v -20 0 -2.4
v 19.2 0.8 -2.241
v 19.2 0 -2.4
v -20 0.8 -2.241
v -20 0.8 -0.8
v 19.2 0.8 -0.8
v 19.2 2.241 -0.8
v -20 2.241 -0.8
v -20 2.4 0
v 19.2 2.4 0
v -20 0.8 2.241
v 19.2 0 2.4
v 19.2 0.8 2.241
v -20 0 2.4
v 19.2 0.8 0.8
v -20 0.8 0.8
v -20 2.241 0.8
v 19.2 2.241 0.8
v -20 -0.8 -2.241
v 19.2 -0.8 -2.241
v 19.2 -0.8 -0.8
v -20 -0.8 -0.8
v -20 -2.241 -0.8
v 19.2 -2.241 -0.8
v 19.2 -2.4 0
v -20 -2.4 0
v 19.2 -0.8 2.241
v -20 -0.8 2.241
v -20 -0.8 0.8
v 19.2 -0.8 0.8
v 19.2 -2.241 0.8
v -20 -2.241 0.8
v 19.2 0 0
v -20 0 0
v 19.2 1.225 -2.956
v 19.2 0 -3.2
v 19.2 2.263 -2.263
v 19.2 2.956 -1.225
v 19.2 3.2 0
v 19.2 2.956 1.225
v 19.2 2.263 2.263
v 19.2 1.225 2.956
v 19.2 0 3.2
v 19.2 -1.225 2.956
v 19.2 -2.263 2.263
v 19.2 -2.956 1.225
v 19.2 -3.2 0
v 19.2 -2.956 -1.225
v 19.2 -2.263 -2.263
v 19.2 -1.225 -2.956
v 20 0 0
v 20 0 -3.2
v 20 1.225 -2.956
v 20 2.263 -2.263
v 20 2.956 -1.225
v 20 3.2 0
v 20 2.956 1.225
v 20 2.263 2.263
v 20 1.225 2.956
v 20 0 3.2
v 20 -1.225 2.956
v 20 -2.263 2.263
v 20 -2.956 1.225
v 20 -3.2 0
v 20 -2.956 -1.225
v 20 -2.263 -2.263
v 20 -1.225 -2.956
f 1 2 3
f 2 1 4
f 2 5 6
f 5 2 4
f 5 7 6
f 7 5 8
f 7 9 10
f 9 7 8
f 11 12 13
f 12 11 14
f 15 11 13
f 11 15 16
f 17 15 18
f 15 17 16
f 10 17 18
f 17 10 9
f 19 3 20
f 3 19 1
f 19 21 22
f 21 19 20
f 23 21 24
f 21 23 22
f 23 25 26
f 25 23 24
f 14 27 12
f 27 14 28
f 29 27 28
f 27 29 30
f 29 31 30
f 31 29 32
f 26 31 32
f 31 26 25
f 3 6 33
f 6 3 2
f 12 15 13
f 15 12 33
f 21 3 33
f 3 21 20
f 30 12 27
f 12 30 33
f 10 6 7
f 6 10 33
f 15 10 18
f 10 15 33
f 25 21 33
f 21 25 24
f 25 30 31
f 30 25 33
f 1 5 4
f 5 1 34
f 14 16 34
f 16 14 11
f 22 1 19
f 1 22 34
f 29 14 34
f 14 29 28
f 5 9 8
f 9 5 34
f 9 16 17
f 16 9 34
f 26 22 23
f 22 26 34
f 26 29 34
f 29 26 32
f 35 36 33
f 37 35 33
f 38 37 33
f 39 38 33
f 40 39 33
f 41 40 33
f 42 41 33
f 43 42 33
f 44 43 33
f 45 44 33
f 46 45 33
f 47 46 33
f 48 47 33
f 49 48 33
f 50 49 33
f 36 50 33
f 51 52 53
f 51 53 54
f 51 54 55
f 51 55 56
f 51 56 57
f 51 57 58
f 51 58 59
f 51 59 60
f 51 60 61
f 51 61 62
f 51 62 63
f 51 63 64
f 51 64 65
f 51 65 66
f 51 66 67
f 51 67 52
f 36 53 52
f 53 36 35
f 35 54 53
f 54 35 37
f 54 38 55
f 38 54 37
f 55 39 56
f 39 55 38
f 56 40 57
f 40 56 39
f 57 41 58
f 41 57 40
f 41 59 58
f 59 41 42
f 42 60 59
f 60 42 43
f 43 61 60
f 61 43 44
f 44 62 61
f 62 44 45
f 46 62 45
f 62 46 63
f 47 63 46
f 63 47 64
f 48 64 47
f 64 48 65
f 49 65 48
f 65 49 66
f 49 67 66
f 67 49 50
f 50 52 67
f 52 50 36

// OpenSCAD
// file: ../p/4-4edge.scad
use <../lib.scad>
function ldraw_lib__4_4edge() = [
// 0 Circle 1.0
// 0 Name: 4-4edge.dat
// 0 Author: James Jessiman
// 0 !LDRAW_ORG Primitive UPDATE 2017-01
// 0 !LICENSE Licensed under CC BY 2.0 and CC BY 4.0 : see CAreadme.txt
// 
// 0 BFC CERTIFY CCW
  [0,"BFC","CERTIFY"],
  [0,"BFC","CCW"],
// 
// 0 !HISTORY 1998-12-15 [PTadmin] Official Update 1998-10
// 0 !HISTORY 2005-12-28 [PTadmin] Official Update 2005-01
// 0 !HISTORY 2007-06-24 [PTadmin] Header formatted for Contributor Agreement
// 0 !HISTORY 2008-07-01 [PTadmin] Official Update 2008-01
// 0 !HISTORY 2017-01-15 [Steffen] BFCed
// 0 !HISTORY 2017-12-30 [PTadmin] Official Update 2017-01
// 
// 
// 2 24 1 0 0 0.9239 0 0.3827
  [2,24,1,0,0,0.9239,0,0.3827],
// 2 24 0.9239 0 0.3827 0.7071 0 0.7071
  [2,24,0.9239,0,0.3827,0.7071,0,0.7071],
// 2 24 0.7071 0 0.7071 0.3827 0 0.9239
  [2,24,0.7071,0,0.7071,0.3827,0,0.9239],
// 2 24 0.3827 0 0.9239 0 0 1
  [2,24,0.3827,0,0.9239,0,0,1],
// 2 24 0 0 1 -0.3827 0 0.9239
  [2,24,0,0,1,-0.3827,0,0.9239],
// 2 24 -0.3827 0 0.9239 -0.7071 0 0.7071
  [2,24,-0.3827,0,0.9239,-0.7071,0,0.7071],
// 2 24 -0.7071 0 0.7071 -0.9239 0 0.3827
  [2,24,-0.7071,0,0.7071,-0.9239,0,0.3827],
// 2 24 -0.9239 0 0.3827 -1 0 -0
  [2,24,-0.9239,0,0.3827,-1,0,-0],
// 2 24 -1 0 -0 -0.9239 0 -0.3827
  [2,24,-1,0,-0,-0.9239,0,-0.3827],
// 2 24 -0.9239 0 -0.3827 -0.7071 0 -0.7071
  [2,24,-0.9239,0,-0.3827,-0.7071,0,-0.7071],
// 2 24 -0.7071 0 -0.7071 -0.3827 0 -0.9239
  [2,24,-0.7071,0,-0.7071,-0.3827,0,-0.9239],
// 2 24 -0.3827 0 -0.9239 0 0 -1
  [2,24,-0.3827,0,-0.9239,0,0,-1],
// 2 24 0 0 -1 0.3827 0 -0.9239
  [2,24,0,0,-1,0.3827,0,-0.9239],
// 2 24 0.3827 0 -0.9239 0.7071 0 -0.7071
  [2,24,0.3827,0,-0.9239,0.7071,0,-0.7071],
// 2 24 0.7071 0 -0.7071 0.9239 0 -0.3827
  [2,24,0.7071,0,-0.7071,0.9239,0,-0.3827],
// 2 24 0.9239 0 -0.3827 1 0 0
  [2,24,0.9239,0,-0.3827,1,0,0],
];
makepoly(ldraw_lib__4_4edge(), line=0.2);
// file: ../p/4-4cyli.scad
use <../lib.scad>
function ldraw_lib__4_4cyli() = [
// 0 Cylinder 1.0
// 0 Name: 4-4cyli.dat
// 0 Author: James Jessiman
// 0 !LDRAW_ORG Primitive UPDATE 2005-01
// 0 !LICENSE Licensed under CC BY 2.0 and CC BY 4.0 : see CAreadme.txt
// 
// 0 BFC CERTIFY CCW
  [0,"BFC","CERTIFY"],
  [0,"BFC","CCW"],
// 
// 0 !HISTORY 1998-12-15 [PTadmin] Official Update 1998-10
// 0 !HISTORY 2002-03-23 [sbliss] Added BFC statement; merged headers from files in distributions LDraw 0.27 and Complete.
// 0 !HISTORY 2002-04-25 [PTadmin] Official Update 2002-02
// 0 !HISTORY 2004-12-14 [guyvivan] BFC CCW
// 0 !HISTORY 2005-12-28 [PTadmin] Official Update 2005-01
// 0 !HISTORY 2007-06-24 [PTadmin] Header formatted for Contributor Agreement
// 0 !HISTORY 2008-07-01 [PTadmin] Official Update 2008-01
// 
// 
// 4 16 1 1 0 0.9239 1 0.3827 0.9239 0 0.3827 1 0 0
  [4,16,1,1,0,0.9239,1,0.3827,0.9239,0,0.3827,1,0,0],
// 5 24 1 0 0 1 1 0 0.9239 0 0.3827 0.9239 0 -0.3827
  [5,24,1,0,0,1,1,0,0.9239,0,0.3827,0.9239,0,-0.3827],
// 4 16 0.9239 1 0.3827 0.7071 1 0.7071 0.7071 0 0.7071 0.9239 0 0.3827
  [4,16,0.9239,1,0.3827,0.7071,1,0.7071,0.7071,0,0.7071,0.9239,0,0.3827],
// 5 24 0.9239 0 0.3827 0.9239 1 0.3827 0.7071 0 0.7071 1 0 0
  [5,24,0.9239,0,0.3827,0.9239,1,0.3827,0.7071,0,0.7071,1,0,0],
// 4 16 0.7071 1 0.7071 0.3827 1 0.9239 0.3827 0 0.9239 0.7071 0 0.7071
  [4,16,0.7071,1,0.7071,0.3827,1,0.9239,0.3827,0,0.9239,0.7071,0,0.7071],
// 5 24 0.7071 0 0.7071 0.7071 1 0.7071 0.3827 0 0.9239 0.9239 0 0.3827
  [5,24,0.7071,0,0.7071,0.7071,1,0.7071,0.3827,0,0.9239,0.9239,0,0.3827],
// 4 16 0.3827 1 0.9239 0 1 1 0 0 1 0.3827 0 0.9239
  [4,16,0.3827,1,0.9239,0,1,1,0,0,1,0.3827,0,0.9239],
// 5 24 0.3827 0 0.9239 0.3827 1 0.9239 0 0 1 0.7071 0 0.7071
  [5,24,0.3827,0,0.9239,0.3827,1,0.9239,0,0,1,0.7071,0,0.7071],
// 4 16 0 1 1 -0.3827 1 0.9239 -0.3827 0 0.9239 0 0 1
  [4,16,0,1,1,-0.3827,1,0.9239,-0.3827,0,0.9239,0,0,1],
// 5 24 0 0 1 0 1 1 -0.3827 0 0.9239 0.3827 0 0.9239
  [5,24,0,0,1,0,1,1,-0.3827,0,0.9239,0.3827,0,0.9239],
// 4 16 -0.3827 1 0.9239 -0.7071 1 0.7071 -0.7071 0 0.7071 -0.3827 0 0.9239
  [4,16,-0.3827,1,0.9239,-0.7071,1,0.7071,-0.7071,0,0.7071,-0.3827,0,0.9239],
// 5 24 -0.3827 0 0.9239 -0.3827 1 0.9239 -0.7071 0 0.7071 0 0 1
  [5,24,-0.3827,0,0.9239,-0.3827,1,0.9239,-0.7071,0,0.7071,0,0,1],
// 4 16 -0.7071 1 0.7071 -0.9239 1 0.3827 -0.9239 0 0.3827 -0.7071 0 0.7071
  [4,16,-0.7071,1,0.7071,-0.9239,1,0.3827,-0.9239,0,0.3827,-0.7071,0,0.7071],
// 5 24 -0.7071 0 0.7071 -0.7071 1 0.7071 -0.9239 0 0.3827 -0.3827 0 0.9239
  [5,24,-0.7071,0,0.7071,-0.7071,1,0.7071,-0.9239,0,0.3827,-0.3827,0,0.9239],
// 4 16 -0.9239 1 0.3827 -1 1 0 -1 0 0 -0.9239 0 0.3827
  [4,16,-0.9239,1,0.3827,-1,1,0,-1,0,0,-0.9239,0,0.3827],
// 5 24 -0.9239 0 0.3827 -0.9239 1 0.3827 -1 0 0 -0.7071 0 0.7071
  [5,24,-0.9239,0,0.3827,-0.9239,1,0.3827,-1,0,0,-0.7071,0,0.7071],
// 4 16 -1 1 0 -0.9239 1 -0.3827 -0.9239 0 -0.3827 -1 0 0
  [4,16,-1,1,0,-0.9239,1,-0.3827,-0.9239,0,-0.3827,-1,0,0],
// 5 24 -1 0 0 -1 1 0 -0.9239 0 -0.3827 -0.9239 0 0.3827
  [5,24,-1,0,0,-1,1,0,-0.9239,0,-0.3827,-0.9239,0,0.3827],
// 4 16 -0.9239 1 -0.3827 -0.7071 1 -0.7071 -0.7071 0 -0.7071 -0.9239 0 -0.3827
  [4,16,-0.9239,1,-0.3827,-0.7071,1,-0.7071,-0.7071,0,-0.7071,-0.9239,0,-0.3827],
// 5 24 -0.9239 0 -0.3827 -0.9239 1 -0.3827 -0.7071 0 -0.7071 -1 0 0
  [5,24,-0.9239,0,-0.3827,-0.9239,1,-0.3827,-0.7071,0,-0.7071,-1,0,0],
// 4 16 -0.7071 1 -0.7071 -0.3827 1 -0.9239 -0.3827 0 -0.9239 -0.7071 0 -0.7071
  [4,16,-0.7071,1,-0.7071,-0.3827,1,-0.9239,-0.3827,0,-0.9239,-0.7071,0,-0.7071],
// 5 24 -0.7071 0 -0.7071 -0.7071 1 -0.7071 -0.3827 0 -0.9239 -0.9239 0 -0.3827
  [5,24,-0.7071,0,-0.7071,-0.7071,1,-0.7071,-0.3827,0,-0.9239,-0.9239,0,-0.3827],
// 4 16 -0.3827 1 -0.9239 0 1 -1 0 0 -1 -0.3827 0 -0.9239
  [4,16,-0.3827,1,-0.9239,0,1,-1,0,0,-1,-0.3827,0,-0.9239],
// 5 24 -0.3827 0 -0.9239 -0.3827 1 -0.9239 0 0 -1 -0.7071 0 -0.7071
  [5,24,-0.3827,0,-0.9239,-0.3827,1,-0.9239,0,0,-1,-0.7071,0,-0.7071],
// 4 16 0 1 -1 0.3827 1 -0.9239 0.3827 0 -0.9239 0 0 -1
  [4,16,0,1,-1,0.3827,1,-0.9239,0.3827,0,-0.9239,0,0,-1],
// 5 24 0 0 -1 0 1 -1 0.3827 0 -0.9239 -0.3827 0 -0.9239
  [5,24,0,0,-1,0,1,-1,0.3827,0,-0.9239,-0.3827,0,-0.9239],
// 4 16 0.3827 1 -0.9239 0.7071 1 -0.7071 0.7071 0 -0.7071 0.3827 0 -0.9239
  [4,16,0.3827,1,-0.9239,0.7071,1,-0.7071,0.7071,0,-0.7071,0.3827,0,-0.9239],
// 5 24 0.3827 0 -0.9239 0.3827 1 -0.9239 0.7071 0 -0.7071 0 0 -1
  [5,24,0.3827,0,-0.9239,0.3827,1,-0.9239,0.7071,0,-0.7071,0,0,-1],
// 4 16 0.7071 1 -0.7071 0.9239 1 -0.3827 0.9239 0 -0.3827 0.7071 0 -0.7071
  [4,16,0.7071,1,-0.7071,0.9239,1,-0.3827,0.9239,0,-0.3827,0.7071,0,-0.7071],
// 5 24 0.7071 0 -0.7071 0.7071 1 -0.7071 0.9239 0 -0.3827 0.3827 0 -0.9239
  [5,24,0.7071,0,-0.7071,0.7071,1,-0.7071,0.9239,0,-0.3827,0.3827,0,-0.9239],
// 4 16 0.9239 1 -0.3827 1 1 0 1 0 0 0.9239 0 -0.3827
  [4,16,0.9239,1,-0.3827,1,1,0,1,0,0,0.9239,0,-0.3827],
// 5 24 0.9239 0 -0.3827 0.9239 1 -0.3827 1 0 0 0.7071 0 -0.7071
  [5,24,0.9239,0,-0.3827,0.9239,1,-0.3827,1,0,0,0.7071,0,-0.7071],
// 0
];
makepoly(ldraw_lib__4_4cyli(), line=0.2);
// file: ../p/axle.scad
use <../lib.scad>
function ldraw_lib__axle() = [
// 0 Axle
// 0 Name: axle.dat
// 0 Author: James Jessiman
// 0 !LDRAW_ORG Primitive UPDATE 2003-01
// 0 !LICENSE Licensed under CC BY 2.0 and CC BY 4.0 : see CAreadme.txt
// 
// 0 BFC CERTIFY CCW
  [0,"BFC","CERTIFY"],
  [0,"BFC","CCW"],
// 
// 0 !HISTORY 2000-04-23 [sbliss] Added conditional edges along outermost diameters
// 0 !HISTORY 2000-05-07 [PTadmin] Official Update 2000-01
// 0 !HISTORY 2002-11-08 [OrionP] Adjusted fit and precision
// 0 !HISTORY 2003-03-12 [PTadmin] Official Update 2003-01
// 0 !HISTORY 2007-06-24 [PTadmin] Header formatted for Contributor Agreement
// 0 !HISTORY 2008-07-01 [PTadmin] Official Update 2008-01
// 
// 
// 5 24 6 0 0 6 1 0 5.602 0 2 5.602 0 -2
  [5,24,6,0,0,6,1,0,5.602,0,2,5.602,0,-2],
// 5 24 0 0 6 0 1 6 2 0 5.602 -2 0 5.602
  [5,24,0,0,6,0,1,6,2,0,5.602,-2,0,5.602],
// 5 24 -6 0 0 -6 1 0 -5.602 0 -2 -5.602 0 2
  [5,24,-6,0,0,-6,1,0,-5.602,0,-2,-5.602,0,2],
// 5 24 0 0 -6 0 1 -6 -2 0 -5.602 2 0 -5.602
  [5,24,0,0,-6,0,1,-6,-2,0,-5.602,2,0,-5.602],
// 
// 2 24 6 0 0 5.602 0 2
  [2,24,6,0,0,5.602,0,2],
// 2 24 5.602 0 2 2 0 2
  [2,24,5.602,0,2,2,0,2],
// 2 24 2 0 2 2 0 5.602
  [2,24,2,0,2,2,0,5.602],
// 2 24 2 0 5.602 0 0 6
  [2,24,2,0,5.602,0,0,6],
// 2 24 -6 0 0 -5.602 0 2
  [2,24,-6,0,0,-5.602,0,2],
// 2 24 -5.602 0 2 -2 0 2
  [2,24,-5.602,0,2,-2,0,2],
// 2 24 -2 0 2 -2 0 5.602
  [2,24,-2,0,2,-2,0,5.602],
// 2 24 -2 0 5.602 -0 0 6
  [2,24,-2,0,5.602,-0,0,6],
// 2 24 6 0 -0 5.602 0 -2
  [2,24,6,0,-0,5.602,0,-2],
// 2 24 5.602 0 -2 2 0 -2
  [2,24,5.602,0,-2,2,0,-2],
// 2 24 2 0 -2 2 0 -5.602
  [2,24,2,0,-2,2,0,-5.602],
// 2 24 2 0 -5.602 0 0 -6
  [2,24,2,0,-5.602,0,0,-6],
// 2 24 -6 0 -0 -5.602 0 -2
  [2,24,-6,0,-0,-5.602,0,-2],
// 2 24 -5.602 0 -2 -2 0 -2
  [2,24,-5.602,0,-2,-2,0,-2],
// 2 24 -2 0 -2 -2 0 -5.602
  [2,24,-2,0,-2,-2,0,-5.602],
// 2 24 -2 0 -5.602 -0 0 -6
  [2,24,-2,0,-5.602,-0,0,-6],
// 2 24 6 1 0 5.602 1 2
  [2,24,6,1,0,5.602,1,2],
// 2 24 5.602 1 2 2 1 2
  [2,24,5.602,1,2,2,1,2],
// 2 24 2 1 2 2 1 5.602
  [2,24,2,1,2,2,1,5.602],
// 2 24 2 1 5.602 0 1 6
  [2,24,2,1,5.602,0,1,6],
// 2 24 -6 1 0 -5.602 1 2
  [2,24,-6,1,0,-5.602,1,2],
// 2 24 -5.602 1 2 -2 1 2
  [2,24,-5.602,1,2,-2,1,2],
// 2 24 -2 1 2 -2 1 5.602
  [2,24,-2,1,2,-2,1,5.602],
// 2 24 -2 1 5.602 -0 1 6
  [2,24,-2,1,5.602,-0,1,6],
// 2 24 6 1 -0 5.602 1 -2
  [2,24,6,1,-0,5.602,1,-2],
// 2 24 5.602 1 -2 2 1 -2
  [2,24,5.602,1,-2,2,1,-2],
// 2 24 2 1 -2 2 1 -5.602
  [2,24,2,1,-2,2,1,-5.602],
// 2 24 2 1 -5.602 0 1 -6
  [2,24,2,1,-5.602,0,1,-6],
// 2 24 -6 1 -0 -5.602 1 -2
  [2,24,-6,1,-0,-5.602,1,-2],
// 2 24 -5.602 1 -2 -2 1 -2
  [2,24,-5.602,1,-2,-2,1,-2],
// 2 24 -2 1 -2 -2 1 -5.602
  [2,24,-2,1,-2,-2,1,-5.602],
// 2 24 -2 1 -5.602 -0 1 -6
  [2,24,-2,1,-5.602,-0,1,-6],
// 
// 2 24 5.602 0 2 5.602 1 2
  [2,24,5.602,0,2,5.602,1,2],
// 2 24 2 0 2 2 1 2
  [2,24,2,0,2,2,1,2],
// 2 24 2 0 5.602 2 1 5.602
  [2,24,2,0,5.602,2,1,5.602],
// 2 24 -5.602 0 2 -5.602 1 2
  [2,24,-5.602,0,2,-5.602,1,2],
// 2 24 -2 0 2 -2 1 2
  [2,24,-2,0,2,-2,1,2],
// 2 24 -2 0 5.602 -2 1 5.602
  [2,24,-2,0,5.602,-2,1,5.602],
// 2 24 5.602 0 -2 5.602 1 -2
  [2,24,5.602,0,-2,5.602,1,-2],
// 2 24 2 0 -2 2 1 -2
  [2,24,2,0,-2,2,1,-2],
// 2 24 2 0 -5.602 2 1 -5.602
  [2,24,2,0,-5.602,2,1,-5.602],
// 2 24 -5.602 0 -2 -5.602 1 -2
  [2,24,-5.602,0,-2,-5.602,1,-2],
// 2 24 -2 0 -2 -2 1 -2
  [2,24,-2,0,-2,-2,1,-2],
// 2 24 -2 0 -5.602 -2 1 -5.602
  [2,24,-2,0,-5.602,-2,1,-5.602],
// 
// 4 16 6 0 0 6 1 0 5.602 1 2 5.602 0 2
  [4,16,6,0,0,6,1,0,5.602,1,2,5.602,0,2],
// 4 16 5.602 0 2 5.602 1 2 2 1 2 2 0 2
  [4,16,5.602,0,2,5.602,1,2,2,1,2,2,0,2],
// 4 16 2 0 2 2 1 2 2 1 5.602 2 0 5.602
  [4,16,2,0,2,2,1,2,2,1,5.602,2,0,5.602],
// 4 16 2 0 5.602 2 1 5.602 0 1 6 0 0 6
  [4,16,2,0,5.602,2,1,5.602,0,1,6,0,0,6],
// 4 16 -6 0 0 -5.602 0 2 -5.602 1 2 -6 1 0
  [4,16,-6,0,0,-5.602,0,2,-5.602,1,2,-6,1,0],
// 4 16 -5.602 0 2 -2 0 2 -2 1 2 -5.602 1 2
  [4,16,-5.602,0,2,-2,0,2,-2,1,2,-5.602,1,2],
// 4 16 -2 0 2 -2 0 5.602 -2 1 5.602 -2 1 2
  [4,16,-2,0,2,-2,0,5.602,-2,1,5.602,-2,1,2],
// 4 16 -2 0 5.602 -0 0 6 -0 1 6 -2 1 5.602
  [4,16,-2,0,5.602,-0,0,6,-0,1,6,-2,1,5.602],
// 4 16 6 0 -0 5.602 0 -2 5.602 1 -2 6 1 -0
  [4,16,6,0,-0,5.602,0,-2,5.602,1,-2,6,1,-0],
// 4 16 5.602 0 -2 2 0 -2 2 1 -2 5.602 1 -2
  [4,16,5.602,0,-2,2,0,-2,2,1,-2,5.602,1,-2],
// 4 16 2 0 -2 2 0 -5.602 2 1 -5.602 2 1 -2
  [4,16,2,0,-2,2,0,-5.602,2,1,-5.602,2,1,-2],
// 4 16 2 0 -5.602 0 0 -6 0 1 -6 2 1 -5.602
  [4,16,2,0,-5.602,0,0,-6,0,1,-6,2,1,-5.602],
// 4 16 -6 0 -0 -6 1 -0 -5.602 1 -2 -5.602 0 -2
  [4,16,-6,0,-0,-6,1,-0,-5.602,1,-2,-5.602,0,-2],
// 4 16 -5.602 0 -2 -5.602 1 -2 -2 1 -2 -2 0 -2
  [4,16,-5.602,0,-2,-5.602,1,-2,-2,1,-2,-2,0,-2],
// 4 16 -2 0 -2 -2 1 -2 -2 1 -5.602 -2 0 -5.602
  [4,16,-2,0,-2,-2,1,-2,-2,1,-5.602,-2,0,-5.602],
// 4 16 -2 0 -5.602 -2 1 -5.602 -0 1 -6 -0 0 -6
  [4,16,-2,0,-5.602,-2,1,-5.602,-0,1,-6,-0,0,-6],
// 
// 4 16 6 0 0 5.602 0 2 2 0 2 0 0 0
  [4,16,6,0,0,5.602,0,2,2,0,2,0,0,0],
// 4 16 -6 0 0 0 0 0 -2 0 2 -5.602 0 2
  [4,16,-6,0,0,0,0,0,-2,0,2,-5.602,0,2],
// 4 16 6 0 0 0 0 0 2 0 -2 5.602 0 -2
  [4,16,6,0,0,0,0,0,2,0,-2,5.602,0,-2],
// 4 16 -6 0 0 -5.602 0 -2 -2 0 -2 0 0 0
  [4,16,-6,0,0,-5.602,0,-2,-2,0,-2,0,0,0],
// 4 16 0 0 6 0 0 0 2 0 2 2 0 5.602
  [4,16,0,0,6,0,0,0,2,0,2,2,0,5.602],
// 4 16 0 0 6 -2 0 5.602 -2 0 2 0 0 0
  [4,16,0,0,6,-2,0,5.602,-2,0,2,0,0,0],
// 4 16 0 0 -6 2 0 -5.602 2 0 -2 0 0 0
  [4,16,0,0,-6,2,0,-5.602,2,0,-2,0,0,0],
// 4 16 0 0 -6 0 0 0 -2 0 -2 -2 0 -5.602
  [4,16,0,0,-6,0,0,0,-2,0,-2,-2,0,-5.602],
// 4 16 6 1 0 0 1 0 2 1 2 5.602 1 2
  [4,16,6,1,0,0,1,0,2,1,2,5.602,1,2],
// 4 16 -6 1 0 -5.602 1 2 -2 1 2 0 1 0
  [4,16,-6,1,0,-5.602,1,2,-2,1,2,0,1,0],
// 4 16 6 1 0 5.602 1 -2 2 1 -2 0 1 0
  [4,16,6,1,0,5.602,1,-2,2,1,-2,0,1,0],
// 4 16 -6 1 0 0 1 0 -2 1 -2 -5.602 1 -2
  [4,16,-6,1,0,0,1,0,-2,1,-2,-5.602,1,-2],
// 4 16 0 1 6 2 1 5.602 2 1 2 0 1 0
  [4,16,0,1,6,2,1,5.602,2,1,2,0,1,0],
// 4 16 0 1 6 0 1 0 -2 1 2 -2 1 5.602
  [4,16,0,1,6,0,1,0,-2,1,2,-2,1,5.602],
// 4 16 0 1 -6 0 1 0 2 1 -2 2 1 -5.602
  [4,16,0,1,-6,0,1,0,2,1,-2,2,1,-5.602],
// 4 16 0 1 -6 -2 1 -5.602 -2 1 -2 0 1 0
  [4,16,0,1,-6,-2,1,-5.602,-2,1,-2,0,1,0],
// 0
];
makepoly(ldraw_lib__axle(), line=0.2);
// file: ../p/4-4disc.scad
use <../lib.scad>
function ldraw_lib__4_4disc() = [
// 0 Disc 1.0
// 0 Name: 4-4disc.dat
// 0 Author: James Jessiman
// 0 !LDRAW_ORG Primitive UPDATE 2002-02
// 0 !LICENSE Licensed under CC BY 2.0 and CC BY 4.0 : see CAreadme.txt
// 
// 0 BFC CERTIFY CCW
  [0,"BFC","CERTIFY"],
  [0,"BFC","CCW"],
// 
// 0 !HISTORY 1998-12-15 [PTadmin] Official Update 1998-10
// 0 !HISTORY 2002-03-23 [sbliss] Added BFC statement
// 0 !HISTORY 2002-04-25 [PTadmin] Official Update 2002-02
// 0 !HISTORY 2007-06-24 [PTadmin] Header formatted for Contributor Agreement
// 0 !HISTORY 2008-07-01 [PTadmin] Official Update 2008-01
// 
// 
// 3 16 0 0 0 1 0 0 0.9239 0 0.3827
  [3,16,0,0,0,1,0,0,0.9239,0,0.3827],
// 3 16 0 0 0 0.9239 0 0.3827 0.7071 0 0.7071
  [3,16,0,0,0,0.9239,0,0.3827,0.7071,0,0.7071],
// 3 16 0 0 0 0.7071 0 0.7071 0.3827 0 0.9239
  [3,16,0,0,0,0.7071,0,0.7071,0.3827,0,0.9239],
// 3 16 0 0 0 0.3827 0 0.9239 0 0 1
  [3,16,0,0,0,0.3827,0,0.9239,0,0,1],
// 3 16 0 0 0 0 0 1 -0.3827 0 0.9239
  [3,16,0,0,0,0,0,1,-0.3827,0,0.9239],
// 3 16 0 0 0 -0.3827 0 0.9239 -0.7071 0 0.7071
  [3,16,0,0,0,-0.3827,0,0.9239,-0.7071,0,0.7071],
// 3 16 0 0 0 -0.7071 0 0.7071 -0.9239 0 0.3827
  [3,16,0,0,0,-0.7071,0,0.7071,-0.9239,0,0.3827],
// 3 16 0 0 0 -0.9239 0 0.3827 -1 0 -0
  [3,16,0,0,0,-0.9239,0,0.3827,-1,0,-0],
// 3 16 0 0 0 -1 0 -0 -0.9239 0 -0.3827
  [3,16,0,0,0,-1,0,-0,-0.9239,0,-0.3827],
// 3 16 0 0 0 -0.9239 0 -0.3827 -0.7071 0 -0.7071
  [3,16,0,0,0,-0.9239,0,-0.3827,-0.7071,0,-0.7071],
// 3 16 0 0 0 -0.7071 0 -0.7071 -0.3827 0 -0.9239
  [3,16,0,0,0,-0.7071,0,-0.7071,-0.3827,0,-0.9239],
// 3 16 0 0 0 -0.3827 0 -0.9239 0 0 -1
  [3,16,0,0,0,-0.3827,0,-0.9239,0,0,-1],
// 3 16 0 0 0 0 0 -1 0.3827 0 -0.9239
  [3,16,0,0,0,0,0,-1,0.3827,0,-0.9239],
// 3 16 0 0 0 0.3827 0 -0.9239 0.7071 0 -0.7071
  [3,16,0,0,0,0.3827,0,-0.9239,0.7071,0,-0.7071],
// 3 16 0 0 0 0.7071 0 -0.7071 0.9239 0 -0.3827
  [3,16,0,0,0,0.7071,0,-0.7071,0.9239,0,-0.3827],
// 3 16 0 0 0 0.9239 0 -0.3827 1 0 0
  [3,16,0,0,0,0.9239,0,-0.3827,1,0,0],
// 0
];
makepoly(ldraw_lib__4_4disc(), line=0.2);
// file: ../p/4-4cylc.scad
use <../lib.scad>
use <4-4cyli.scad>
use <4-4disc.scad>
use <4-4edge.scad>
function ldraw_lib__4_4cylc() = [
// 0 Cylinder Closed 1.0
// 0 Name: 4-4cylc.dat
// 0 Author: Alex Taylor [anathema]
// 0 !LDRAW_ORG Primitive UPDATE 2009-02
// 0 !LICENSE Licensed under CC BY 2.0 and CC BY 4.0 : see CAreadme.txt
// 
// 0 BFC CERTIFY CCW
  [0,"BFC","CERTIFY"],
  [0,"BFC","CCW"],
// 
// 0 !HISTORY 2008-12-29 [cwdee] Removed one disc
// 0 !HISTORY 2009-09-03 [PTadmin] Official Update 2009-02
// 
// 
// 1 16 0 0 0 1 0 0 0 1 0 0 0 1 4-4edge.dat
  [1,16,0,0,0,1,0,0,0,1,0,0,0,1, ldraw_lib__4_4edge()],
// 1 16 0 1 0 1 0 0 0 1 0 0 0 1 4-4edge.dat
  [1,16,0,1,0,1,0,0,0,1,0,0,0,1, ldraw_lib__4_4edge()],
// 1 16 0 0 0 1 0 0 0 1 0 0 0 1 4-4disc.dat
  [1,16,0,0,0,1,0,0,0,1,0,0,0,1, ldraw_lib__4_4disc()],
// 1 16 0 0 0 1 0 0 0 1 0 0 0 1 4-4cyli.dat
  [1,16,0,0,0,1,0,0,0,1,0,0,0,1, ldraw_lib__4_4cyli()],
// 0
];
makepoly(ldraw_lib__4_4cylc(), line=0.2);
// main file
use <../lib.scad>
use <../p/4-4cylc.scad>
use <../p/4-4disc.scad>
use <../p/axle.scad>
function ldraw_lib__15462() = [
// 0 Technic Axle  5 with Stop
// 0 Name: 15462.dat
// 0 Author: Max Martin Richter [MMR1988]
// 0 !LDRAW_ORG Part UPDATE 2013-02
// 0 !LICENSE Licensed under CC BY 2.0 and CC BY 4.0 : see CAreadme.txt
// 
// 0 BFC CERTIFY CCW
  [0,"BFC","CERTIFY"],
  [0,"BFC","CCW"],
// 
// 0 !HISTORY 2013-12-01 [MMR1988] Creation
// 0 !HISTORY 2013-12-23 [PTadmin] Official Update 2013-02
// 
// 
// 1 16 48 0 0 0 -98 0 1 0 0 0 0 1 axle.dat
  [1,16,48,0,0,0,-98,0,1,0,0,0,0,1, ldraw_lib__axle()],
// 1 16 48 0 0 0 1 0 8 0 0 0 0 8 4-4disc.dat
  [1,16,48,0,0,0,1,0,8,0,0,0,0,8, ldraw_lib__4_4disc()],
// 1 16 50 0 0 0 -2 0 8 0 0 0 0 8 4-4cylc.dat
  [1,16,50,0,0,0,-2,0,8,0,0,0,0,8, ldraw_lib__4_4cylc()],
];
makepoly(ldraw_lib__15462(), line=0.2);
